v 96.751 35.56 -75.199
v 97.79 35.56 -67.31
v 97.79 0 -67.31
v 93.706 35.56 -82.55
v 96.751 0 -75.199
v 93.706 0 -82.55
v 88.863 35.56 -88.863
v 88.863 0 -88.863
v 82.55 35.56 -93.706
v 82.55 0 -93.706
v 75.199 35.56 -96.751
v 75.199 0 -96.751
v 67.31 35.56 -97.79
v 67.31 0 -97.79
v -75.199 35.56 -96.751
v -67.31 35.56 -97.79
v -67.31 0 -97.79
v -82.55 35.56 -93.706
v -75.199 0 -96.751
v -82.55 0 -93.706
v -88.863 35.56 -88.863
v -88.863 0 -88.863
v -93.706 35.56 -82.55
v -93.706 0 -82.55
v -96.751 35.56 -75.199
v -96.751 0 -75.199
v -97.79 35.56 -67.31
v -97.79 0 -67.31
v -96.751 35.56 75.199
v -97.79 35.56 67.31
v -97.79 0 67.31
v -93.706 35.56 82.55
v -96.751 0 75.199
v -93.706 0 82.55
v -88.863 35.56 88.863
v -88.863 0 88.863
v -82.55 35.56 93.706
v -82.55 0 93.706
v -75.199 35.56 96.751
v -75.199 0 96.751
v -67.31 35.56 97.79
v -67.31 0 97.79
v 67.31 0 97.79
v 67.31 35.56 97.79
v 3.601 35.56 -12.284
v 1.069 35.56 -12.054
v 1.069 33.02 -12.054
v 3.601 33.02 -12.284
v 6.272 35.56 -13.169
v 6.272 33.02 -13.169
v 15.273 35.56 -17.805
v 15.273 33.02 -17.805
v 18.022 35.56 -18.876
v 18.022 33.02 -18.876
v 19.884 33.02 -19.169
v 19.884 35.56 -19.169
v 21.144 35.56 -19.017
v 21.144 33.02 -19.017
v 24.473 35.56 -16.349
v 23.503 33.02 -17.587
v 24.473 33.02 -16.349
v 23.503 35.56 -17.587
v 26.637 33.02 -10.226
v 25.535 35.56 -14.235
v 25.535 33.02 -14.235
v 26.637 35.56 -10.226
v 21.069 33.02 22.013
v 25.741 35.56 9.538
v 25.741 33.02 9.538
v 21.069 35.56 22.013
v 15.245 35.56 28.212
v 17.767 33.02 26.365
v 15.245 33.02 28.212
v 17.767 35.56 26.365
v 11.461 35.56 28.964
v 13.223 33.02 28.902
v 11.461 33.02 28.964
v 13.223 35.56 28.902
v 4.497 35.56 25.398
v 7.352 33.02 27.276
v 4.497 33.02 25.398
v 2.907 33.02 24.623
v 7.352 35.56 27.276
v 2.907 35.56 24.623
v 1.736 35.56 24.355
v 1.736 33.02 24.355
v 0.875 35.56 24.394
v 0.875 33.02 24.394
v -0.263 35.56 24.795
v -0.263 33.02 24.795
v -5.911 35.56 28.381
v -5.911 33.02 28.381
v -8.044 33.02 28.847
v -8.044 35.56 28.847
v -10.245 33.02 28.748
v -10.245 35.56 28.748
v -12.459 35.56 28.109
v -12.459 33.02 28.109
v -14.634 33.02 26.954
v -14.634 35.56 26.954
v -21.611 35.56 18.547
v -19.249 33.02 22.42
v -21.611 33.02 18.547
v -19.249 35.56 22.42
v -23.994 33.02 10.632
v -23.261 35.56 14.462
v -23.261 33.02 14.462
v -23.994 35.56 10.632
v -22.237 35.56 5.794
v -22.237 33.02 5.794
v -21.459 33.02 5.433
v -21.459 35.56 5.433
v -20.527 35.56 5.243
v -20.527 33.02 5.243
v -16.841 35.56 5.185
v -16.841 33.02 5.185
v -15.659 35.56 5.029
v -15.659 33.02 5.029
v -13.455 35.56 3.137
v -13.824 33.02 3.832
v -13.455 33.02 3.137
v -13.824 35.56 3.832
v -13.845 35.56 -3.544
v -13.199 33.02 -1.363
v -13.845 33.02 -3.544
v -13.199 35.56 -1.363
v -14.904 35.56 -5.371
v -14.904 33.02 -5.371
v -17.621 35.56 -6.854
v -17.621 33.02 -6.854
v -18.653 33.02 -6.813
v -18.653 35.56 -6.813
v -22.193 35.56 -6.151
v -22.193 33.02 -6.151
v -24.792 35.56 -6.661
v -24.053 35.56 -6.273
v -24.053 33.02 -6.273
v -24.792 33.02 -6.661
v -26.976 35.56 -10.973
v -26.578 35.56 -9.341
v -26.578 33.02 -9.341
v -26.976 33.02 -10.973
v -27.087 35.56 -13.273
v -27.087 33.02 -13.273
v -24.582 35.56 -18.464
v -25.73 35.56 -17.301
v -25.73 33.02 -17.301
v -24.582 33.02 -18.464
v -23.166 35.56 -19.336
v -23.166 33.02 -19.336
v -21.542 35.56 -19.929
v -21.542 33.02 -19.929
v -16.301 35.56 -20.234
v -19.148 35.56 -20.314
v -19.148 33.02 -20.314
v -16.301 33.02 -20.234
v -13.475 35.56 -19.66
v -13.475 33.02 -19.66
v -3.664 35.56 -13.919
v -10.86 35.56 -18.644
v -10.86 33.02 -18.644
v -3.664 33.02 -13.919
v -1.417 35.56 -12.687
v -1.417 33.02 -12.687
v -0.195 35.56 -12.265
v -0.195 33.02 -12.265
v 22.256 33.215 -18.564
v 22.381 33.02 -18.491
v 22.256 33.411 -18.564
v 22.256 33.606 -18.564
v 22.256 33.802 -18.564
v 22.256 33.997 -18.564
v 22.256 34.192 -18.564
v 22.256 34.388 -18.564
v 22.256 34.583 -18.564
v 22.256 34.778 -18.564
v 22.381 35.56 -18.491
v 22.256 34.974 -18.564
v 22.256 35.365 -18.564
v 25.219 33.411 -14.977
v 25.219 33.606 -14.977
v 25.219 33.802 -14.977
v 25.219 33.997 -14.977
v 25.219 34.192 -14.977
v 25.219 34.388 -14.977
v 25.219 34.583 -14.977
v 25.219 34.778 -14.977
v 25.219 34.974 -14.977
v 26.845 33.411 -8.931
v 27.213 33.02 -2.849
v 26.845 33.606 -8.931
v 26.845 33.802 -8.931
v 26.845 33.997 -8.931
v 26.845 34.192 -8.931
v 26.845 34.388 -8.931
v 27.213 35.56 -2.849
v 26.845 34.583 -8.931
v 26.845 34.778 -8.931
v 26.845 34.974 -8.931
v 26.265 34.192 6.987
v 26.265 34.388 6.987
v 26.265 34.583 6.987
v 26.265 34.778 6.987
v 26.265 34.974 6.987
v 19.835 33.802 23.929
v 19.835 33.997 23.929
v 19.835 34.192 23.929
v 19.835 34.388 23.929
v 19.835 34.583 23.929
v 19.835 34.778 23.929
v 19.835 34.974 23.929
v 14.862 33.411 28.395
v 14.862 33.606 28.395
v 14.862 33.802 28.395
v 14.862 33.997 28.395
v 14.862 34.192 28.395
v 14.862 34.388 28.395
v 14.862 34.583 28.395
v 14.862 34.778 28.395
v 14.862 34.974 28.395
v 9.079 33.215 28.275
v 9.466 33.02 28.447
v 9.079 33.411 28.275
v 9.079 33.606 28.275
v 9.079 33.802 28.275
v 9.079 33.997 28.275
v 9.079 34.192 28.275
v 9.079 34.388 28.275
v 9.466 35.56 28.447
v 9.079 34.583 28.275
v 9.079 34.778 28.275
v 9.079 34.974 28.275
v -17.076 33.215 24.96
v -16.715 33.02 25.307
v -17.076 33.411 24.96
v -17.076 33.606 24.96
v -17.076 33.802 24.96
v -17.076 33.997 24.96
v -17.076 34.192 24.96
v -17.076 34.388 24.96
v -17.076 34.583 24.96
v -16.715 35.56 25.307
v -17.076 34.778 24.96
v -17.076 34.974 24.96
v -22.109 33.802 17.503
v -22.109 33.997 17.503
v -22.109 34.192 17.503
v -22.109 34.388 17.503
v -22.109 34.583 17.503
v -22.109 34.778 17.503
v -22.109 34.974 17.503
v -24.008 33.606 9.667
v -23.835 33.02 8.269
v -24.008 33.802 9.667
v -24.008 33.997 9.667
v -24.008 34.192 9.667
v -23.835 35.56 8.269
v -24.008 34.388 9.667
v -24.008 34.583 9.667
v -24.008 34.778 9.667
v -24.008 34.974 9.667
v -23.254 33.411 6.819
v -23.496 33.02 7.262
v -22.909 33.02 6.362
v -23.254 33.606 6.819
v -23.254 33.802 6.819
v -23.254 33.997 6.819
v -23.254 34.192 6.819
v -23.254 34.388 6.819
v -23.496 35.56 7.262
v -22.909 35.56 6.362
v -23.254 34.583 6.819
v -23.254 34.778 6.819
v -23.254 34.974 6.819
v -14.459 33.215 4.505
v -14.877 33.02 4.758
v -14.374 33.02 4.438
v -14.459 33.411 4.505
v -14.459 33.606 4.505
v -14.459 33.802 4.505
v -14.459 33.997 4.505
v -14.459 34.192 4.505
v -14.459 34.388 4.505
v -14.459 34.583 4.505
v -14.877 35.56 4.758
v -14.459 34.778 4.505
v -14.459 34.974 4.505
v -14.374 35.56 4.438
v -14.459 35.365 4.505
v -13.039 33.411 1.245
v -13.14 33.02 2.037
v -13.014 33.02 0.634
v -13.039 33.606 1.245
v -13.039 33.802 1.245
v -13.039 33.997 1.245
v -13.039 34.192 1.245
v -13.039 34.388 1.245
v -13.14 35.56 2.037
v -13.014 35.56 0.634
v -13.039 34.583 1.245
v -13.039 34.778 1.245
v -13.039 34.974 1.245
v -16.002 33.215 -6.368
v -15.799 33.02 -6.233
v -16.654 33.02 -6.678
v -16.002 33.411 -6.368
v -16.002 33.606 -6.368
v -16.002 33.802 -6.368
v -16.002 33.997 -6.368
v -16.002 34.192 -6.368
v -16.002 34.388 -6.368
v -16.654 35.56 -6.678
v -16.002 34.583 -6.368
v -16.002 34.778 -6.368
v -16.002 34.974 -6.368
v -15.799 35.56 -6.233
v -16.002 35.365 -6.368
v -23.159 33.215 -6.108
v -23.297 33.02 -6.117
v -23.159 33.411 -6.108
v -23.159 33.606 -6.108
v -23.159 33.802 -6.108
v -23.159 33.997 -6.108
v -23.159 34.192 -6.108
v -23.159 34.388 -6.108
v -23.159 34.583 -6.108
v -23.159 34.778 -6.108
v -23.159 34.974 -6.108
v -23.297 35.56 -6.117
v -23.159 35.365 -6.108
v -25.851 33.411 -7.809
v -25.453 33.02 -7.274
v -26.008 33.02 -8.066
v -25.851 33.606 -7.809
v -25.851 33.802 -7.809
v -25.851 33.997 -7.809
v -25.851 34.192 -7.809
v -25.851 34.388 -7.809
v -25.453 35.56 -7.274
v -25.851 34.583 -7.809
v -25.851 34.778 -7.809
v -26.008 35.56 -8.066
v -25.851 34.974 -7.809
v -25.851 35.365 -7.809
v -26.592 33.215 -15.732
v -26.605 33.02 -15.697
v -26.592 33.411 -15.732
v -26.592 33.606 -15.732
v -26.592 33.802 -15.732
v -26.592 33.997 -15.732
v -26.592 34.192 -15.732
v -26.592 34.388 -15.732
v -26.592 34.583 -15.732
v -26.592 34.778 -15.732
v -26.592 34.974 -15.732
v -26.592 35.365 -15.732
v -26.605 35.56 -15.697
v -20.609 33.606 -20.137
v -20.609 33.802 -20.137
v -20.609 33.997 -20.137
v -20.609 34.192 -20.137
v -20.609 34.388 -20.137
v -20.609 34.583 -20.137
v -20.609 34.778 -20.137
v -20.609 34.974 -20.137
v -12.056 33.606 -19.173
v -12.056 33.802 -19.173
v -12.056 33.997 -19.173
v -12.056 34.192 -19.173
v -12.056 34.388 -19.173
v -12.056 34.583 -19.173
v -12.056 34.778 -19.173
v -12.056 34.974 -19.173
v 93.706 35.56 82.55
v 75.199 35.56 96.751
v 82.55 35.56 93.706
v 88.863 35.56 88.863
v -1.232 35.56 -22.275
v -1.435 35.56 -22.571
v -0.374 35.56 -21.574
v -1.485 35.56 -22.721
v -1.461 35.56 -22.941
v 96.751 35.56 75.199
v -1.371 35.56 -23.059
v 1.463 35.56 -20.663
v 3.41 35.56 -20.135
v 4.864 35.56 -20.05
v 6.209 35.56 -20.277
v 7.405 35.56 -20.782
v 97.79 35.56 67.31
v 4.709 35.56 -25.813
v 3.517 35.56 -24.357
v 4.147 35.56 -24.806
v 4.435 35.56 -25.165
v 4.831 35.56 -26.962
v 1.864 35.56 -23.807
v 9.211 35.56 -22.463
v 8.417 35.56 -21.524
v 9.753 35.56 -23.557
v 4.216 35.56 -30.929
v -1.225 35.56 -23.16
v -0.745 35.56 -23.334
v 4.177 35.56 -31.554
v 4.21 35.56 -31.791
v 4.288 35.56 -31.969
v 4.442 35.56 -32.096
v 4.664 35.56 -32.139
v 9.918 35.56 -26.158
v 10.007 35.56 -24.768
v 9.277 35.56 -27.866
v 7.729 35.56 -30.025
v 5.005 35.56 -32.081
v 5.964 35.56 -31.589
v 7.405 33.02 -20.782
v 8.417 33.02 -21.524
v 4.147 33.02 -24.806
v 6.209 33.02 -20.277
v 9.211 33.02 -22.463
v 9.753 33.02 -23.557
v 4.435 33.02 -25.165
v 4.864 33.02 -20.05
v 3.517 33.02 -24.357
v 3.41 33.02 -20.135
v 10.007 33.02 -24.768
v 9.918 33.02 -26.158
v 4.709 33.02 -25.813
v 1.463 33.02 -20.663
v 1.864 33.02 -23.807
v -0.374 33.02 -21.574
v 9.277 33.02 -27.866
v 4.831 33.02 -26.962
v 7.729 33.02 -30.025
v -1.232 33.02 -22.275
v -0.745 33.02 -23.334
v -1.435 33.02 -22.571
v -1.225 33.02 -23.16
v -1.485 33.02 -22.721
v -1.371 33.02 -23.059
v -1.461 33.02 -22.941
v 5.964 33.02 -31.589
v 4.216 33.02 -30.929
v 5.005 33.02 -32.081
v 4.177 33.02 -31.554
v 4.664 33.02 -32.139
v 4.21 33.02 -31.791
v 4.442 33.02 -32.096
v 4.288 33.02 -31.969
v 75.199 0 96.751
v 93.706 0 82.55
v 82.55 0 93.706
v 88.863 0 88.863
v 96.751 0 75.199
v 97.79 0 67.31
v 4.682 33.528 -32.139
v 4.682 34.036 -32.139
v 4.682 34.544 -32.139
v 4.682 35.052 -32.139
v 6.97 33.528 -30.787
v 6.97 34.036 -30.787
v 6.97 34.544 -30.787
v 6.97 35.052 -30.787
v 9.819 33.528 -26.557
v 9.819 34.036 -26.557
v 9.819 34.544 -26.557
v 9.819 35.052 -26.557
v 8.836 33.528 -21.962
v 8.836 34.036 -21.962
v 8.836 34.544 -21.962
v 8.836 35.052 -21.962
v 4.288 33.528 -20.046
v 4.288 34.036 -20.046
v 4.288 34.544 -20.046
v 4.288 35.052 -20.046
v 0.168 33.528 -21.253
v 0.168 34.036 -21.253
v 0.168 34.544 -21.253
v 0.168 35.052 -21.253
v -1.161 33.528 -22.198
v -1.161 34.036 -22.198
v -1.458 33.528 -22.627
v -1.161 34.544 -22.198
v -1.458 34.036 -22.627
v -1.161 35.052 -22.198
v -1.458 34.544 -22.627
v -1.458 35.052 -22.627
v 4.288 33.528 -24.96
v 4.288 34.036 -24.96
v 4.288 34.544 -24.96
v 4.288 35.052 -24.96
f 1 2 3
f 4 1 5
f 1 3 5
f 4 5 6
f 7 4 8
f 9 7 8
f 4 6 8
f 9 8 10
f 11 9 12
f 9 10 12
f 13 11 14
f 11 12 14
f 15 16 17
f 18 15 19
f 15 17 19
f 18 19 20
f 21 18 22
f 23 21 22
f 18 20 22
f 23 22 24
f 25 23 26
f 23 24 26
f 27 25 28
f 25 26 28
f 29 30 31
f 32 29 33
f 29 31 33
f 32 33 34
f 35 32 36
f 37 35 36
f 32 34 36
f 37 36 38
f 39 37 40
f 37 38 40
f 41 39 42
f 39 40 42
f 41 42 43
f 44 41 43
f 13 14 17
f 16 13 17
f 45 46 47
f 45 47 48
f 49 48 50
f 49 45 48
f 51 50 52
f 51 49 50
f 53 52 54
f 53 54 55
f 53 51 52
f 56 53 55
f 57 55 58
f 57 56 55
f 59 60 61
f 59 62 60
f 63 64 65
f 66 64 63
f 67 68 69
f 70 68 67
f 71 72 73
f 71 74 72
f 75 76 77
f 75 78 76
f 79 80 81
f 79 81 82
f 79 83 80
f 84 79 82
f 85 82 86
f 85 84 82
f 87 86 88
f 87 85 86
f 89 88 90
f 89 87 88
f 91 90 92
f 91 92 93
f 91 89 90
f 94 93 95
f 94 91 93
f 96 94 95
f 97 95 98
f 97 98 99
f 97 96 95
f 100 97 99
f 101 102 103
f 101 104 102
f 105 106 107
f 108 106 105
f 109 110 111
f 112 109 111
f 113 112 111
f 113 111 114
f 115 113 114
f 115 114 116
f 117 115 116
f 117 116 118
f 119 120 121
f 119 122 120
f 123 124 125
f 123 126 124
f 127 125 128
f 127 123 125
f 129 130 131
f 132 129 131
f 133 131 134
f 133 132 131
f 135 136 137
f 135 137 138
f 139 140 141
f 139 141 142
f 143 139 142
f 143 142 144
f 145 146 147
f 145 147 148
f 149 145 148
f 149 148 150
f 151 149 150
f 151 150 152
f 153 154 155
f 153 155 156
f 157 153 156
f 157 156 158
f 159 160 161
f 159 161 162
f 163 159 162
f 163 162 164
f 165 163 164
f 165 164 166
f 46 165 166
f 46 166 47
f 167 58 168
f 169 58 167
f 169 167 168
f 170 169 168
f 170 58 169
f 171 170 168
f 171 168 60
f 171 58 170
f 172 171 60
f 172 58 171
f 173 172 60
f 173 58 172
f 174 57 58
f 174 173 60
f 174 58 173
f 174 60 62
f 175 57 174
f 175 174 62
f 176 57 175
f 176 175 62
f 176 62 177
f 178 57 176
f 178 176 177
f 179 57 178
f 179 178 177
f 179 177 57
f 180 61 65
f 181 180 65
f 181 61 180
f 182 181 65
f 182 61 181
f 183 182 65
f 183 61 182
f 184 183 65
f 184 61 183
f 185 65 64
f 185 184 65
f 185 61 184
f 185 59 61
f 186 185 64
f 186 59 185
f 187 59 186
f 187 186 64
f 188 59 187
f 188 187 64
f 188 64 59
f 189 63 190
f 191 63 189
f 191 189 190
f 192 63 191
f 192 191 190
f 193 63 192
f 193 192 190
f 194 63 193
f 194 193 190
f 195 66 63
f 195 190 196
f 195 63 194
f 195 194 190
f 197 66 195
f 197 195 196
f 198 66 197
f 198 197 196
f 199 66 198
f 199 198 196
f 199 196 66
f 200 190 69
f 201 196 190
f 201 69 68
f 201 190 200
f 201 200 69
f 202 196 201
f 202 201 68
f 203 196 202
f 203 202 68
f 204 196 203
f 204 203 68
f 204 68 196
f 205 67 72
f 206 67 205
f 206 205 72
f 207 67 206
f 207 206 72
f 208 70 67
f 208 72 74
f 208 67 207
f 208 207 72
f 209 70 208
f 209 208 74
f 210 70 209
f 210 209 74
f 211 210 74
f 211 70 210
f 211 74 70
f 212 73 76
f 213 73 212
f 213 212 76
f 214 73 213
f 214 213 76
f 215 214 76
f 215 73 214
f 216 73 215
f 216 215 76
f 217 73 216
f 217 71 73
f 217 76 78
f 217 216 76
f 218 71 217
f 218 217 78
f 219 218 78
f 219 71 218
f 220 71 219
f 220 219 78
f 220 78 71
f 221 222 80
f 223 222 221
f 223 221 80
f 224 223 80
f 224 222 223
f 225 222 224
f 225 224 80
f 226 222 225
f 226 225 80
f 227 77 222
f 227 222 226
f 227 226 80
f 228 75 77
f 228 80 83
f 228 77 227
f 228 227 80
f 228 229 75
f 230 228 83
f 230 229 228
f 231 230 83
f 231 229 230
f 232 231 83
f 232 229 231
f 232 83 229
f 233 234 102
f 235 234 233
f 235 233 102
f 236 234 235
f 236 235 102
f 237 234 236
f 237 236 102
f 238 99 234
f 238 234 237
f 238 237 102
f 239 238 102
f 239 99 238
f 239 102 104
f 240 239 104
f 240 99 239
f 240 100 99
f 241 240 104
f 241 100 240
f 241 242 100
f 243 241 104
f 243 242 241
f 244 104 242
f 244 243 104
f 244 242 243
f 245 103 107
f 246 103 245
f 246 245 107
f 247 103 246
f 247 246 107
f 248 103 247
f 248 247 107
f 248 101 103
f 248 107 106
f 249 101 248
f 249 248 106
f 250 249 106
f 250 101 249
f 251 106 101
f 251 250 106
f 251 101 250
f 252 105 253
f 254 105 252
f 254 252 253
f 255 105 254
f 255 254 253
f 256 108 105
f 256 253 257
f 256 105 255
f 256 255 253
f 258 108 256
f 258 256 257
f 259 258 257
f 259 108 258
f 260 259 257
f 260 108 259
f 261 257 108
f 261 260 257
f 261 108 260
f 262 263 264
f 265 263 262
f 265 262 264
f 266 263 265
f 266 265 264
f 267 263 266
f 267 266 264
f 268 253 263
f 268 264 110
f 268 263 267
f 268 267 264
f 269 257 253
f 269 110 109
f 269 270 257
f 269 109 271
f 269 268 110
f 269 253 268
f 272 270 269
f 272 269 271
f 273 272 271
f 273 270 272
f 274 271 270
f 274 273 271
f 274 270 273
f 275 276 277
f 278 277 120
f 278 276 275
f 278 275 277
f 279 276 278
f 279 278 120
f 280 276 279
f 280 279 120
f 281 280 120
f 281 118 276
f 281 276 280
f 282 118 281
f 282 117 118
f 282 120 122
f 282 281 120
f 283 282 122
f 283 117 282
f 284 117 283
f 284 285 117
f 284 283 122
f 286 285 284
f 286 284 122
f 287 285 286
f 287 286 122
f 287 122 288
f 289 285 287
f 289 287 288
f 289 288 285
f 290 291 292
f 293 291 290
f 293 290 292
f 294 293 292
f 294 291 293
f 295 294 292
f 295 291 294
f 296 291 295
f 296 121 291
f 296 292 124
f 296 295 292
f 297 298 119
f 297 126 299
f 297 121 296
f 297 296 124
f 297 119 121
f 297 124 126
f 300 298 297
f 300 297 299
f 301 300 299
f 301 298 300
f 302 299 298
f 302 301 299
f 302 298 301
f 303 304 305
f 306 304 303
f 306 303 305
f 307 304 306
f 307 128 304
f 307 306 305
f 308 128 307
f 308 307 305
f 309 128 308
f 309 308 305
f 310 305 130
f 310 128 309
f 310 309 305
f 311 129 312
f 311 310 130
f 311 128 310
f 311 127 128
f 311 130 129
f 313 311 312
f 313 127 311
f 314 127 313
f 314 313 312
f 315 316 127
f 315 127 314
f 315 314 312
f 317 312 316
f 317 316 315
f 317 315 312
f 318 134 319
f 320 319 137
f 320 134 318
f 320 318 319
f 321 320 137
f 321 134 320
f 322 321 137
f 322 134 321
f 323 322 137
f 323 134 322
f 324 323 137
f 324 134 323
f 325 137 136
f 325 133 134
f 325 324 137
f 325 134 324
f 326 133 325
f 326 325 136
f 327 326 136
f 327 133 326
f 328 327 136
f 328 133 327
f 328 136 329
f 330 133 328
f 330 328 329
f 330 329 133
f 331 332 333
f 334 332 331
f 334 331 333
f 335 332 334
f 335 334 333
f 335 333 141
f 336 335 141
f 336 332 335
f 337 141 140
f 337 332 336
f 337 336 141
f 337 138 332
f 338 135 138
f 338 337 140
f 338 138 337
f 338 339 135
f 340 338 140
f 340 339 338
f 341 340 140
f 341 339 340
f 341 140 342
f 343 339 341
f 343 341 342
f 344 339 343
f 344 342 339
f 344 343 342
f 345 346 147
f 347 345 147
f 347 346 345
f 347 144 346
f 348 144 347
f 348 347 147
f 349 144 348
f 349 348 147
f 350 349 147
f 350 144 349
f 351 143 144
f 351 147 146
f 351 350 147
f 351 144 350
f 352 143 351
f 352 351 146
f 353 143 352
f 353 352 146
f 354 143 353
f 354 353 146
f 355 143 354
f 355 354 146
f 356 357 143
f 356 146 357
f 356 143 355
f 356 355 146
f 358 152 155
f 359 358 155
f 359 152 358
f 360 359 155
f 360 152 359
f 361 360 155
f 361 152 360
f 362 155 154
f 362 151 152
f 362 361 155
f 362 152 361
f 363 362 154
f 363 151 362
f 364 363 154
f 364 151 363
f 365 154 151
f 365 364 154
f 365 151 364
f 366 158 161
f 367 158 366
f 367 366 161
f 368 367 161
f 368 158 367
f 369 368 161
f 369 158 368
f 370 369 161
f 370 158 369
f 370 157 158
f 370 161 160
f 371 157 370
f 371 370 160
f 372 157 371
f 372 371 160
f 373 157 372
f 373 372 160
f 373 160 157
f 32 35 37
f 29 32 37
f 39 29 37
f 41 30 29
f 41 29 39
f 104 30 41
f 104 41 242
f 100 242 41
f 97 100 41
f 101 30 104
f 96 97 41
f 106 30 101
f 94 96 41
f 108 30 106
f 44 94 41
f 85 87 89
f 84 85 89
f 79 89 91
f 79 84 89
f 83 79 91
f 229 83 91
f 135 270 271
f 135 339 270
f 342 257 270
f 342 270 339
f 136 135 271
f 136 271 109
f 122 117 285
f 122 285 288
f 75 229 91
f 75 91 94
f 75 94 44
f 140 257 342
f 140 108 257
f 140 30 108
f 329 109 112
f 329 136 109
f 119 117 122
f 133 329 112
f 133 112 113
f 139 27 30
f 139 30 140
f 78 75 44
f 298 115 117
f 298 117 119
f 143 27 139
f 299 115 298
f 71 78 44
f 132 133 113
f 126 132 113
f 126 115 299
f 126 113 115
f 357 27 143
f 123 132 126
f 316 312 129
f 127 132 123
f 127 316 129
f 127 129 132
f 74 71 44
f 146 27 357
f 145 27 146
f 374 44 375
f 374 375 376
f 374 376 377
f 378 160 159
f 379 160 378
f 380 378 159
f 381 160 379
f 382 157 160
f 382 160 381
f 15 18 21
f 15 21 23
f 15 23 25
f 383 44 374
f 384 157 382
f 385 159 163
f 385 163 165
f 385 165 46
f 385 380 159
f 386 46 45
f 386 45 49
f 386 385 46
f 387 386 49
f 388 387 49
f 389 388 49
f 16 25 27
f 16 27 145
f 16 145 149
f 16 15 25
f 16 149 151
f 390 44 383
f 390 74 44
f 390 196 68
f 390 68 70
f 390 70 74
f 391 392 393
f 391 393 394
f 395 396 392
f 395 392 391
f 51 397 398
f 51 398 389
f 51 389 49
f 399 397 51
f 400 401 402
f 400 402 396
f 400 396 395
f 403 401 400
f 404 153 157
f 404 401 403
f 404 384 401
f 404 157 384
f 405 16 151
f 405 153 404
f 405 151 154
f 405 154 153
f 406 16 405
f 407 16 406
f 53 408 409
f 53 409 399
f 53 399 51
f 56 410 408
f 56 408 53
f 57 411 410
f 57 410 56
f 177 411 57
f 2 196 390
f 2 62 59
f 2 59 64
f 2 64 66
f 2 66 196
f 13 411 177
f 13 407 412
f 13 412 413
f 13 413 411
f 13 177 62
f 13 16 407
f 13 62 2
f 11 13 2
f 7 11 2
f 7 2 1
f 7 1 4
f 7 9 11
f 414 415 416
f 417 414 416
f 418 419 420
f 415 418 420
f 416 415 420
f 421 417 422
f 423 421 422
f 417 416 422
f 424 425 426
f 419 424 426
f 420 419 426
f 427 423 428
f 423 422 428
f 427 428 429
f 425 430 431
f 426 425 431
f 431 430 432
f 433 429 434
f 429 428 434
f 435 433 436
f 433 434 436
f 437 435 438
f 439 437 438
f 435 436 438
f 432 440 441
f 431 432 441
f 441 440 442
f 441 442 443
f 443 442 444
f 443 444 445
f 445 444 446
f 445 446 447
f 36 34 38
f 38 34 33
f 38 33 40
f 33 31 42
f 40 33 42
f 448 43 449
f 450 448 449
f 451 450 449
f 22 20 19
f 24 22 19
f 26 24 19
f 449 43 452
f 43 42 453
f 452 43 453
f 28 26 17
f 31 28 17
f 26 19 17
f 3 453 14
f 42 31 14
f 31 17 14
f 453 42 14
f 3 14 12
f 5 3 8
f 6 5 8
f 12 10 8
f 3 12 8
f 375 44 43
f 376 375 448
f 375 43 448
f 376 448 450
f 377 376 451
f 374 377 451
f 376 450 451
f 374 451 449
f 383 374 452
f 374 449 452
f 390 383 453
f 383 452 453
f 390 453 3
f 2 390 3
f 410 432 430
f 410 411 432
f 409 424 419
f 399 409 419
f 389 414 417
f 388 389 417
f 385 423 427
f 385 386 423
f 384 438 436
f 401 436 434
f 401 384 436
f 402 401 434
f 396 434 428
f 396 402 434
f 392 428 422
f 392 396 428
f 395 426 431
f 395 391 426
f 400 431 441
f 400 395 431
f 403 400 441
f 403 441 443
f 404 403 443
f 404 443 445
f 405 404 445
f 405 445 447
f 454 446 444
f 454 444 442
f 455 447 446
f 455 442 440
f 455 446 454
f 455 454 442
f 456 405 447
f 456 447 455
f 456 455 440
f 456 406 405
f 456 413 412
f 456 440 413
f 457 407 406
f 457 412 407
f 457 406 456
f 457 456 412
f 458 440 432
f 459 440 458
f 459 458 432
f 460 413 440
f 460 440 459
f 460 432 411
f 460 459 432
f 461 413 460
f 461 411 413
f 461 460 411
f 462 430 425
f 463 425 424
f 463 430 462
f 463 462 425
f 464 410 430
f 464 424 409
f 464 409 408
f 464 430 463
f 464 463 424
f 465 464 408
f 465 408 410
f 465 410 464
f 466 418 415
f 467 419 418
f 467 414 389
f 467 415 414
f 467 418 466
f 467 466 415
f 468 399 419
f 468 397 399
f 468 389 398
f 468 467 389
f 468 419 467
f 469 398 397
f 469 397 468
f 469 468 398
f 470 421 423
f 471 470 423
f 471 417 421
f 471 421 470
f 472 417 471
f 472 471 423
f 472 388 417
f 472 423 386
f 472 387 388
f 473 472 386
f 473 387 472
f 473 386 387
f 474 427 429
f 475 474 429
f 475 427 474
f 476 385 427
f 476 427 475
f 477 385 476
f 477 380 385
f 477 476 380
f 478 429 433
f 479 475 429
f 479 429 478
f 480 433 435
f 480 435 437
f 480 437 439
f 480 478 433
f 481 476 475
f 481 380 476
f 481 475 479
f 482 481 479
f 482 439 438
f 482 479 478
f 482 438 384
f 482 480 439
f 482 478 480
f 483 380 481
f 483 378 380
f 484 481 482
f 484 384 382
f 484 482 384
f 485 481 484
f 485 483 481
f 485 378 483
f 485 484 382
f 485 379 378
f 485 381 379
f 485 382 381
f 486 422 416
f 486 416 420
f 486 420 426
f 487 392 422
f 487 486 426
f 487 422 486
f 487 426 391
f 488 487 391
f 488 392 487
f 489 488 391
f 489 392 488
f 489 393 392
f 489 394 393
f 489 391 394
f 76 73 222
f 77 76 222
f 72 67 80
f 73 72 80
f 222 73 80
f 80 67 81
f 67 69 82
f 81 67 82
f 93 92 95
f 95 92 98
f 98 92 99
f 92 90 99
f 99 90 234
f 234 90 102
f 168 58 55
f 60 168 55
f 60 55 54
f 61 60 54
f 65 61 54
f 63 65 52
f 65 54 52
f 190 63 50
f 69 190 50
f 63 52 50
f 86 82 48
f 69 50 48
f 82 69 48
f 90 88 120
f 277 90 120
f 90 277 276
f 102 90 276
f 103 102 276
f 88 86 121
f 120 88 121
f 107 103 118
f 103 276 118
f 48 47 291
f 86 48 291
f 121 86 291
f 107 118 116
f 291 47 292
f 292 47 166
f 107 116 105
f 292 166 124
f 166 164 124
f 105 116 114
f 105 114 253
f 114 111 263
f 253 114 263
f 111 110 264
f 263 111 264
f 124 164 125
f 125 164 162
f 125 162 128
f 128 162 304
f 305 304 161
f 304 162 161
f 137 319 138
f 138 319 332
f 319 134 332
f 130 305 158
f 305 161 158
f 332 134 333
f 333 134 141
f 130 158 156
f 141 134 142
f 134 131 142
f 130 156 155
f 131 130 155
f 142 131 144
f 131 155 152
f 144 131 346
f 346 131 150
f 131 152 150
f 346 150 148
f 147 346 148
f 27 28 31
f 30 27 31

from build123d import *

# Parameters (mm, degrees)
BOSS_EXTRUDE1_DEPTH = 35.56
CUT_EXTRUDE1_DEPTH  = 2.54


with BuildPart() as part:
    # Sketch1 → Boss-Extrude1 (new body)
    with BuildSketch(Plane(origin=(0, 0, 0), x_dir=(1, 0, 0), z_dir=(0, 1, 0))):
        with BuildLine():
            Line((-67.31, -97.79), (67.31, -97.79))
            ThreePointArc((67.31, -97.79), (88.862614691, -88.862614691), (97.79, -67.31))
            Line((97.79, -67.31), (97.79, 67.31))
            ThreePointArc((97.79, 67.31), (88.862614691, 88.862614691), (67.31, 97.79))
            Line((67.31, 97.79), (-67.31, 97.79))
            ThreePointArc((-67.31, 97.79), (-88.862614691, 88.862614691), (-97.79, 67.31))
            Line((-97.79, 67.31), (-97.79, -67.31))
            ThreePointArc((-97.79, -67.31), (-88.862614691, -88.862614691), (-67.31, -97.79))
        make_face()
    extrude(amount=BOSS_EXTRUDE1_DEPTH)

    # Sketch2 → Cut-Extrude1 (cut)
    with BuildSketch(Plane(origin=(0, 35.56, 0), x_dir=(1, 0, 0), z_dir=(0, 1, 0))):
        with BuildLine():
            add(Edge.make_bspline(
                [(1.069159263, 12.053957352), (7.026900295, 11.625396007), (25.310862844, 29.234177767), (30.491031338, -7.916988095), (15.026759827, -36.109498005), (1.530770275, -21.83529591), (-6.040576613, -30.612635114), (-20.658401128, -26.846483994), (-28.267746675, -2.501714901), (-10.902260805, -7.058320175), (-14.044140154, 10.399607654), (-25.914455938, 3.072974608), (-29.507731033, 20.421135825), (-10.125556887, 21.796230615), (-3.363362348, 12.372804279), (1.069159263, 12.053957352)],
                knots=[0, 0, 0, 0, 0.107274199, 0.250434142, 0.395980258, 0.443398128, 0.47894856, 0.546712741, 0.653285311, 0.68880468, 0.749021257, 0.788585463, 0.841034552, 0.920188675, 1, 1, 1, 1], degree=3))
        make_face()
        with BuildLine():
            add(Edge.make_bspline(
                [(4.288165985, 31.968571753), (4.959875783, 32.927739875), (13.302817449, 26.054551709), (5.976088668, 17.468338472), (-5.163355857, 24.084090932), (7.583617977, 23.014813046), (3.679789011, 31.099839749), (4.288165985, 31.968571753)],
                knots=[0, 0, 0, 0, 0.21621725, 0.454945614, 0.634777537, 0.804169008, 1, 1, 1, 1], degree=3))
        make_face()
    extrude(amount=-CUT_EXTRUDE1_DEPTH, mode=Mode.SUBTRACT)


solid = part.part
